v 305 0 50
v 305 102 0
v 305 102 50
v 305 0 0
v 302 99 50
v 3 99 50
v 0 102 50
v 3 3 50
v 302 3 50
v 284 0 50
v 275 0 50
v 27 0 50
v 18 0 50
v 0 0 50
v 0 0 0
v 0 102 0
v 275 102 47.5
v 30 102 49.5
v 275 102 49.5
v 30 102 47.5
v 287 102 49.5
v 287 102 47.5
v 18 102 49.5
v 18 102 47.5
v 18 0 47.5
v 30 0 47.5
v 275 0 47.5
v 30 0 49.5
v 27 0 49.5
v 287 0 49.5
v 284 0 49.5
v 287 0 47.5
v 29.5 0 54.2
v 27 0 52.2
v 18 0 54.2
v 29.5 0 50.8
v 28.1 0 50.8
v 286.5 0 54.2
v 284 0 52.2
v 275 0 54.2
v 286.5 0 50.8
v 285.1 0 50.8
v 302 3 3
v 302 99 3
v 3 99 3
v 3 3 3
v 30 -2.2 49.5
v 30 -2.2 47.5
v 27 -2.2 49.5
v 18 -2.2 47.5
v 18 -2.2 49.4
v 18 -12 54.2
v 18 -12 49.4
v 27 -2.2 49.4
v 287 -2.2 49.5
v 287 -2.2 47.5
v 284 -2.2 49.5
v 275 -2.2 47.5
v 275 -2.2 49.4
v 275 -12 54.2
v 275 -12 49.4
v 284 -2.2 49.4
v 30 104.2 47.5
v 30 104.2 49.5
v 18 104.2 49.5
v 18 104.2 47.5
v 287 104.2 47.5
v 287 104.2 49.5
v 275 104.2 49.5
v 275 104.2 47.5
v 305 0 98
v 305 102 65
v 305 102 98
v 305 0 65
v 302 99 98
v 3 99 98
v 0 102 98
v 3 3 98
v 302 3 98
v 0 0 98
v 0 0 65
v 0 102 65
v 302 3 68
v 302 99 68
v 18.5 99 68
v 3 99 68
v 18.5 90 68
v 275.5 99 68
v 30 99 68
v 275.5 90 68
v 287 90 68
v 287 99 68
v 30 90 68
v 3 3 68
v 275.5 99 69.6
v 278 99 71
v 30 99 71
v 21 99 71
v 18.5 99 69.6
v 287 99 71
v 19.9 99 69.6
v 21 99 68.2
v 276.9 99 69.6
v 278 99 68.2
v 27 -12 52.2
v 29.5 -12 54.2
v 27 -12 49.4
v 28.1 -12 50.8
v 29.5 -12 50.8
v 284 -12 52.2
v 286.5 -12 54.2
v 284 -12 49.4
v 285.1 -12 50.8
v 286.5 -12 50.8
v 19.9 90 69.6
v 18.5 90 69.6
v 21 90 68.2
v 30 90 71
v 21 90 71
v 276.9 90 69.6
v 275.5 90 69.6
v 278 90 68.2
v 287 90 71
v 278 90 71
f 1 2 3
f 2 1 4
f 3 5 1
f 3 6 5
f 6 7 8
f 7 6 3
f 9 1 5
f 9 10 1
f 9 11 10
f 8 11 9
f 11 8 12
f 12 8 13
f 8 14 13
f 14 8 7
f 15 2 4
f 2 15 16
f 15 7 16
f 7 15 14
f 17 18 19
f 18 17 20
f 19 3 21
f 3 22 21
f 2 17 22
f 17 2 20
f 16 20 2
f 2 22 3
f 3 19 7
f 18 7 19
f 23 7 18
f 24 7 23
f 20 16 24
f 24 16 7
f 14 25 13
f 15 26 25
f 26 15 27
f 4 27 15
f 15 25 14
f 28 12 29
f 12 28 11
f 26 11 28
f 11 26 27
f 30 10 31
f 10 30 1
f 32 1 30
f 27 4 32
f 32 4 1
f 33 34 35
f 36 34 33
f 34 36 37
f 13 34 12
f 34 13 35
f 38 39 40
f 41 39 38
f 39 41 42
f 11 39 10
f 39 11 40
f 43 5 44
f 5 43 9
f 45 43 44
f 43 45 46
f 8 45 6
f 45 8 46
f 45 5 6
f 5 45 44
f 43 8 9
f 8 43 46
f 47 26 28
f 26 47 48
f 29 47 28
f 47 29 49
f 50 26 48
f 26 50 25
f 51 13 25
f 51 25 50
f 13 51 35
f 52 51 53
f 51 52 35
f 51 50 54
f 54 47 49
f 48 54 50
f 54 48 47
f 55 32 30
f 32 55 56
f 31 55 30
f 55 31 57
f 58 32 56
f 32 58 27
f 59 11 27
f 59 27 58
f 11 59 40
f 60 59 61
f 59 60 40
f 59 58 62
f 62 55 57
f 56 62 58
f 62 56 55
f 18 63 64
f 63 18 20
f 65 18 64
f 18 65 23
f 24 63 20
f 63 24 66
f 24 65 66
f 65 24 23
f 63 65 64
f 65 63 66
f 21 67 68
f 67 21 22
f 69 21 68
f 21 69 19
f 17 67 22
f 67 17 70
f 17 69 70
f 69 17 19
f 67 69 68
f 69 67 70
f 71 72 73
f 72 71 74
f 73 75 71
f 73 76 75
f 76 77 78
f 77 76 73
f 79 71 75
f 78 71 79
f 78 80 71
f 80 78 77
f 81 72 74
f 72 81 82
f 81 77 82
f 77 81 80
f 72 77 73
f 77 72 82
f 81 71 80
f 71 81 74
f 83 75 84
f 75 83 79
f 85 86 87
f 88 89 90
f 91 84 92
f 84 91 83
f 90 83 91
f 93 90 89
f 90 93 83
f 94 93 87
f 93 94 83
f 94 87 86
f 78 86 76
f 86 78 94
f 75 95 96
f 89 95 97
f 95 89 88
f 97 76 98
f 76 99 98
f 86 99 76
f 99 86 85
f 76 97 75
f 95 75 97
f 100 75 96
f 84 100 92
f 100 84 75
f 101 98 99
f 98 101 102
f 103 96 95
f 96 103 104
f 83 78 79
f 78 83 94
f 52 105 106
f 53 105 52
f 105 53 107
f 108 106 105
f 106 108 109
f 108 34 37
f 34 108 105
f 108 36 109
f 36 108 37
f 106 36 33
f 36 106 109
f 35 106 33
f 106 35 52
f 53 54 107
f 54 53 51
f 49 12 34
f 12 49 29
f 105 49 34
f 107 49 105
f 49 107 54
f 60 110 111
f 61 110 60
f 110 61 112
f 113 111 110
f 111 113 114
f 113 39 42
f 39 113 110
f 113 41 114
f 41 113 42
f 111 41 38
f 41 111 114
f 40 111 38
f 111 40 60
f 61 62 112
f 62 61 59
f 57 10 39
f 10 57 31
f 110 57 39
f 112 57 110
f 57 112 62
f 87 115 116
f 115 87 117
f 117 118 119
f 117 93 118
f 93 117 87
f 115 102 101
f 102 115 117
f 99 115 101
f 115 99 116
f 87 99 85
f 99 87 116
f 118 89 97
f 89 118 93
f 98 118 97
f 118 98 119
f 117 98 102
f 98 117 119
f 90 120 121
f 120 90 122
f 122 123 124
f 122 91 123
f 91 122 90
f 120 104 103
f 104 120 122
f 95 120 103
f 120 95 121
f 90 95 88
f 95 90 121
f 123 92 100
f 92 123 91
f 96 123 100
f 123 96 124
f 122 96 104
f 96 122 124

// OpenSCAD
// 01_corner_hooks.scad
// Snap-fit corner hook clips: four L-shaped cantilever hooks on the upper tray
// hook over a small ledge printed on the lower tray's outer rim corners.
// Engage: press upper tray down; hooks flex outward then snap under ledge.
// Release: pinch/flex two opposite hooks outward simultaneously, lift.

/* ---- global params ---- */
$fn = 36;
EXPLODE = 15;   // set 0 for engaged, >0 for exploded lift

/* ---- tray dimensions ---- */
LX = 305; LY = 102; LZ = 50;   // lower tray
UX = 305; UY = 102; UZ = 33;   // upper tray
W  = 3;                          // wall thickness

/* ---- hook params ---- */
HK_W   = 12;    // hook foot width
HK_T   = 2.8;   // cantilever arm thickness
HK_L   = 9;     // arm length (flex length)
HK_H   = 4.5;   // total hook depth past tray face
LEDGE_H = 2.0;  // ledge height on lower tray
LEDGE_P = 2.2;  // ledge protrusion
RAMP    = 1.4;  // ramp height on hook tip for self-guiding

// corner offsets from ends
CX = 18; CY = 10;

module lower_tray() {
    color("SteelBlue", 0.85)
    difference() {
        cube([LX, LY, LZ]);
        translate([W, W, W]) cube([LX-2*W, LY-2*W, LZ]);
    }
}

// ledge block glued to lower tray outer face at each corner
module corner_ledge(side) {
    // side: 0=front(Y=0), 1=back(Y=LY), 2=left(X=0), 3=right(X=LX)
    color("SteelBlue", 0.85)
    if (side == 0 || side == 1) {
        oy = (side == 0) ? 0 : LY;
        sy = (side == 0) ? -LEDGE_P : 0;
        for (ox = [CX, LX-CX-HK_W])
            translate([ox, oy + sy, LZ - LEDGE_H - 0.5])
                cube([HK_W, LEDGE_P, LEDGE_H]);
    } else {
        ox2 = (side == 2) ? 0 : LX;
        sx2 = (side == 2) ? -LEDGE_P : 0;
        for (oy2 = [CY, LY-CY-HK_W])
            translate([ox2 + sx2, oy2, LZ - LEDGE_H - 0.5])
                cube([LEDGE_P, HK_W, LEDGE_H]);
    }
}

module upper_tray() {
    color("Tomato", 0.85)
    difference() {
        cube([UX, UY, UZ]);
        translate([W, W, W]) cube([UX-2*W, UY-2*W, UZ]);
    }
}

// cantilever hook arm + hook tip, on upper tray outer face
// base_pt: [x,y] corner on upper tray face; dir: outward normal [dx,dy]
module hook_arm(base_pt, dir, along) {
    // arm: HK_L long in dir, HK_T thick, HK_W wide along 'along'
    ax = base_pt[0]; ay = base_pt[1];
    dx = dir[0]; dy = dir[1];
    alx = along[0]; aly = along[1];

    color("OrangeRed", 0.9)
    union() {
        // cantilever arm (thin plate extending outward)
        translate([ax, ay, -HK_H + W])
        rotate([0,0, atan2(dy,dx)])
        translate([-HK_W/2 * abs(aly), -HK_W/2 * abs(alx), 0]) // center on width
        {
            // arm body
            cube([HK_W * abs(aly) + HK_L * abs(dx),
                  HK_W * abs(alx) + HK_L * abs(dy),
                  HK_T]);
            // hook tip with ramp (snaps under ledge)
            translate([HK_L * abs(dx) + (abs(dx)>0?0:0),
                       HK_L * abs(dy) + (abs(dy)>0?0:0), 0])
            // simplified: just add a nub
            cube([HK_W * abs(aly) + (LEDGE_P+0.4)*abs(dx),
                  HK_W * abs(alx) + (LEDGE_P+0.4)*abs(dy),
                  HK_T + LEDGE_H + RAMP]);
        }
    }
}

// Simpler: parametric hook as rotate-extruded profile
module single_hook(flip=false) {
    // Hook cross-section profile (in XZ plane), width = HK_W along Y
    // arm goes in +X, hook tip curves down at the end
    f = flip ? -1 : 1;
    color("OrangeRed", 0.92)
    translate([0, -HK_W/2, 0])
    linear_extrude(HK_W)
    polygon(points=[
        [0, 0],
        [HK_L + LEDGE_P + 0.3, 0],
        [HK_L + LEDGE_P + 0.3, -(LEDGE_H + RAMP)],
        [HK_L + LEDGE_P + 0.3 - RAMP, -(LEDGE_H + RAMP)],
        [HK_L,  -LEDGE_H],
        [HK_L, -HK_T - LEDGE_H],
        [0, -HK_T - LEDGE_H]
    ]);
}

// Place hooks on upper tray perimeter corners
// Front face (Y=0): two hooks pointing in -Y
module upper_hooks() {
    Z0 = -HK_T - LEDGE_H;   // hook base flush with bottom of upper tray

    // Front face hooks (point in -Y direction, i.e. rotate to aim outward)
    for (xi = [CX, UX - CX - HK_W]) {
        translate([xi, 0, Z0])
        rotate([90, 0, 0])
        single_hook();
    }
    // Back face hooks (point in +Y direction)
    for (xi = [CX, UX - CX - HK_W]) {
        translate([xi + HK_W, UY, Z0])
        rotate([-90, 0, 180])
        single_hook();
    }
}

/* ---- assembly ---- */
// Lower tray at origin
lower_tray();
for (s=[0,1]) corner_ledge(s);

// Upper tray sitting on lower tray (or exploded above)
translate([0, 0, LZ + EXPLODE]) {
    upper_tray();
    upper_hooks();
}
